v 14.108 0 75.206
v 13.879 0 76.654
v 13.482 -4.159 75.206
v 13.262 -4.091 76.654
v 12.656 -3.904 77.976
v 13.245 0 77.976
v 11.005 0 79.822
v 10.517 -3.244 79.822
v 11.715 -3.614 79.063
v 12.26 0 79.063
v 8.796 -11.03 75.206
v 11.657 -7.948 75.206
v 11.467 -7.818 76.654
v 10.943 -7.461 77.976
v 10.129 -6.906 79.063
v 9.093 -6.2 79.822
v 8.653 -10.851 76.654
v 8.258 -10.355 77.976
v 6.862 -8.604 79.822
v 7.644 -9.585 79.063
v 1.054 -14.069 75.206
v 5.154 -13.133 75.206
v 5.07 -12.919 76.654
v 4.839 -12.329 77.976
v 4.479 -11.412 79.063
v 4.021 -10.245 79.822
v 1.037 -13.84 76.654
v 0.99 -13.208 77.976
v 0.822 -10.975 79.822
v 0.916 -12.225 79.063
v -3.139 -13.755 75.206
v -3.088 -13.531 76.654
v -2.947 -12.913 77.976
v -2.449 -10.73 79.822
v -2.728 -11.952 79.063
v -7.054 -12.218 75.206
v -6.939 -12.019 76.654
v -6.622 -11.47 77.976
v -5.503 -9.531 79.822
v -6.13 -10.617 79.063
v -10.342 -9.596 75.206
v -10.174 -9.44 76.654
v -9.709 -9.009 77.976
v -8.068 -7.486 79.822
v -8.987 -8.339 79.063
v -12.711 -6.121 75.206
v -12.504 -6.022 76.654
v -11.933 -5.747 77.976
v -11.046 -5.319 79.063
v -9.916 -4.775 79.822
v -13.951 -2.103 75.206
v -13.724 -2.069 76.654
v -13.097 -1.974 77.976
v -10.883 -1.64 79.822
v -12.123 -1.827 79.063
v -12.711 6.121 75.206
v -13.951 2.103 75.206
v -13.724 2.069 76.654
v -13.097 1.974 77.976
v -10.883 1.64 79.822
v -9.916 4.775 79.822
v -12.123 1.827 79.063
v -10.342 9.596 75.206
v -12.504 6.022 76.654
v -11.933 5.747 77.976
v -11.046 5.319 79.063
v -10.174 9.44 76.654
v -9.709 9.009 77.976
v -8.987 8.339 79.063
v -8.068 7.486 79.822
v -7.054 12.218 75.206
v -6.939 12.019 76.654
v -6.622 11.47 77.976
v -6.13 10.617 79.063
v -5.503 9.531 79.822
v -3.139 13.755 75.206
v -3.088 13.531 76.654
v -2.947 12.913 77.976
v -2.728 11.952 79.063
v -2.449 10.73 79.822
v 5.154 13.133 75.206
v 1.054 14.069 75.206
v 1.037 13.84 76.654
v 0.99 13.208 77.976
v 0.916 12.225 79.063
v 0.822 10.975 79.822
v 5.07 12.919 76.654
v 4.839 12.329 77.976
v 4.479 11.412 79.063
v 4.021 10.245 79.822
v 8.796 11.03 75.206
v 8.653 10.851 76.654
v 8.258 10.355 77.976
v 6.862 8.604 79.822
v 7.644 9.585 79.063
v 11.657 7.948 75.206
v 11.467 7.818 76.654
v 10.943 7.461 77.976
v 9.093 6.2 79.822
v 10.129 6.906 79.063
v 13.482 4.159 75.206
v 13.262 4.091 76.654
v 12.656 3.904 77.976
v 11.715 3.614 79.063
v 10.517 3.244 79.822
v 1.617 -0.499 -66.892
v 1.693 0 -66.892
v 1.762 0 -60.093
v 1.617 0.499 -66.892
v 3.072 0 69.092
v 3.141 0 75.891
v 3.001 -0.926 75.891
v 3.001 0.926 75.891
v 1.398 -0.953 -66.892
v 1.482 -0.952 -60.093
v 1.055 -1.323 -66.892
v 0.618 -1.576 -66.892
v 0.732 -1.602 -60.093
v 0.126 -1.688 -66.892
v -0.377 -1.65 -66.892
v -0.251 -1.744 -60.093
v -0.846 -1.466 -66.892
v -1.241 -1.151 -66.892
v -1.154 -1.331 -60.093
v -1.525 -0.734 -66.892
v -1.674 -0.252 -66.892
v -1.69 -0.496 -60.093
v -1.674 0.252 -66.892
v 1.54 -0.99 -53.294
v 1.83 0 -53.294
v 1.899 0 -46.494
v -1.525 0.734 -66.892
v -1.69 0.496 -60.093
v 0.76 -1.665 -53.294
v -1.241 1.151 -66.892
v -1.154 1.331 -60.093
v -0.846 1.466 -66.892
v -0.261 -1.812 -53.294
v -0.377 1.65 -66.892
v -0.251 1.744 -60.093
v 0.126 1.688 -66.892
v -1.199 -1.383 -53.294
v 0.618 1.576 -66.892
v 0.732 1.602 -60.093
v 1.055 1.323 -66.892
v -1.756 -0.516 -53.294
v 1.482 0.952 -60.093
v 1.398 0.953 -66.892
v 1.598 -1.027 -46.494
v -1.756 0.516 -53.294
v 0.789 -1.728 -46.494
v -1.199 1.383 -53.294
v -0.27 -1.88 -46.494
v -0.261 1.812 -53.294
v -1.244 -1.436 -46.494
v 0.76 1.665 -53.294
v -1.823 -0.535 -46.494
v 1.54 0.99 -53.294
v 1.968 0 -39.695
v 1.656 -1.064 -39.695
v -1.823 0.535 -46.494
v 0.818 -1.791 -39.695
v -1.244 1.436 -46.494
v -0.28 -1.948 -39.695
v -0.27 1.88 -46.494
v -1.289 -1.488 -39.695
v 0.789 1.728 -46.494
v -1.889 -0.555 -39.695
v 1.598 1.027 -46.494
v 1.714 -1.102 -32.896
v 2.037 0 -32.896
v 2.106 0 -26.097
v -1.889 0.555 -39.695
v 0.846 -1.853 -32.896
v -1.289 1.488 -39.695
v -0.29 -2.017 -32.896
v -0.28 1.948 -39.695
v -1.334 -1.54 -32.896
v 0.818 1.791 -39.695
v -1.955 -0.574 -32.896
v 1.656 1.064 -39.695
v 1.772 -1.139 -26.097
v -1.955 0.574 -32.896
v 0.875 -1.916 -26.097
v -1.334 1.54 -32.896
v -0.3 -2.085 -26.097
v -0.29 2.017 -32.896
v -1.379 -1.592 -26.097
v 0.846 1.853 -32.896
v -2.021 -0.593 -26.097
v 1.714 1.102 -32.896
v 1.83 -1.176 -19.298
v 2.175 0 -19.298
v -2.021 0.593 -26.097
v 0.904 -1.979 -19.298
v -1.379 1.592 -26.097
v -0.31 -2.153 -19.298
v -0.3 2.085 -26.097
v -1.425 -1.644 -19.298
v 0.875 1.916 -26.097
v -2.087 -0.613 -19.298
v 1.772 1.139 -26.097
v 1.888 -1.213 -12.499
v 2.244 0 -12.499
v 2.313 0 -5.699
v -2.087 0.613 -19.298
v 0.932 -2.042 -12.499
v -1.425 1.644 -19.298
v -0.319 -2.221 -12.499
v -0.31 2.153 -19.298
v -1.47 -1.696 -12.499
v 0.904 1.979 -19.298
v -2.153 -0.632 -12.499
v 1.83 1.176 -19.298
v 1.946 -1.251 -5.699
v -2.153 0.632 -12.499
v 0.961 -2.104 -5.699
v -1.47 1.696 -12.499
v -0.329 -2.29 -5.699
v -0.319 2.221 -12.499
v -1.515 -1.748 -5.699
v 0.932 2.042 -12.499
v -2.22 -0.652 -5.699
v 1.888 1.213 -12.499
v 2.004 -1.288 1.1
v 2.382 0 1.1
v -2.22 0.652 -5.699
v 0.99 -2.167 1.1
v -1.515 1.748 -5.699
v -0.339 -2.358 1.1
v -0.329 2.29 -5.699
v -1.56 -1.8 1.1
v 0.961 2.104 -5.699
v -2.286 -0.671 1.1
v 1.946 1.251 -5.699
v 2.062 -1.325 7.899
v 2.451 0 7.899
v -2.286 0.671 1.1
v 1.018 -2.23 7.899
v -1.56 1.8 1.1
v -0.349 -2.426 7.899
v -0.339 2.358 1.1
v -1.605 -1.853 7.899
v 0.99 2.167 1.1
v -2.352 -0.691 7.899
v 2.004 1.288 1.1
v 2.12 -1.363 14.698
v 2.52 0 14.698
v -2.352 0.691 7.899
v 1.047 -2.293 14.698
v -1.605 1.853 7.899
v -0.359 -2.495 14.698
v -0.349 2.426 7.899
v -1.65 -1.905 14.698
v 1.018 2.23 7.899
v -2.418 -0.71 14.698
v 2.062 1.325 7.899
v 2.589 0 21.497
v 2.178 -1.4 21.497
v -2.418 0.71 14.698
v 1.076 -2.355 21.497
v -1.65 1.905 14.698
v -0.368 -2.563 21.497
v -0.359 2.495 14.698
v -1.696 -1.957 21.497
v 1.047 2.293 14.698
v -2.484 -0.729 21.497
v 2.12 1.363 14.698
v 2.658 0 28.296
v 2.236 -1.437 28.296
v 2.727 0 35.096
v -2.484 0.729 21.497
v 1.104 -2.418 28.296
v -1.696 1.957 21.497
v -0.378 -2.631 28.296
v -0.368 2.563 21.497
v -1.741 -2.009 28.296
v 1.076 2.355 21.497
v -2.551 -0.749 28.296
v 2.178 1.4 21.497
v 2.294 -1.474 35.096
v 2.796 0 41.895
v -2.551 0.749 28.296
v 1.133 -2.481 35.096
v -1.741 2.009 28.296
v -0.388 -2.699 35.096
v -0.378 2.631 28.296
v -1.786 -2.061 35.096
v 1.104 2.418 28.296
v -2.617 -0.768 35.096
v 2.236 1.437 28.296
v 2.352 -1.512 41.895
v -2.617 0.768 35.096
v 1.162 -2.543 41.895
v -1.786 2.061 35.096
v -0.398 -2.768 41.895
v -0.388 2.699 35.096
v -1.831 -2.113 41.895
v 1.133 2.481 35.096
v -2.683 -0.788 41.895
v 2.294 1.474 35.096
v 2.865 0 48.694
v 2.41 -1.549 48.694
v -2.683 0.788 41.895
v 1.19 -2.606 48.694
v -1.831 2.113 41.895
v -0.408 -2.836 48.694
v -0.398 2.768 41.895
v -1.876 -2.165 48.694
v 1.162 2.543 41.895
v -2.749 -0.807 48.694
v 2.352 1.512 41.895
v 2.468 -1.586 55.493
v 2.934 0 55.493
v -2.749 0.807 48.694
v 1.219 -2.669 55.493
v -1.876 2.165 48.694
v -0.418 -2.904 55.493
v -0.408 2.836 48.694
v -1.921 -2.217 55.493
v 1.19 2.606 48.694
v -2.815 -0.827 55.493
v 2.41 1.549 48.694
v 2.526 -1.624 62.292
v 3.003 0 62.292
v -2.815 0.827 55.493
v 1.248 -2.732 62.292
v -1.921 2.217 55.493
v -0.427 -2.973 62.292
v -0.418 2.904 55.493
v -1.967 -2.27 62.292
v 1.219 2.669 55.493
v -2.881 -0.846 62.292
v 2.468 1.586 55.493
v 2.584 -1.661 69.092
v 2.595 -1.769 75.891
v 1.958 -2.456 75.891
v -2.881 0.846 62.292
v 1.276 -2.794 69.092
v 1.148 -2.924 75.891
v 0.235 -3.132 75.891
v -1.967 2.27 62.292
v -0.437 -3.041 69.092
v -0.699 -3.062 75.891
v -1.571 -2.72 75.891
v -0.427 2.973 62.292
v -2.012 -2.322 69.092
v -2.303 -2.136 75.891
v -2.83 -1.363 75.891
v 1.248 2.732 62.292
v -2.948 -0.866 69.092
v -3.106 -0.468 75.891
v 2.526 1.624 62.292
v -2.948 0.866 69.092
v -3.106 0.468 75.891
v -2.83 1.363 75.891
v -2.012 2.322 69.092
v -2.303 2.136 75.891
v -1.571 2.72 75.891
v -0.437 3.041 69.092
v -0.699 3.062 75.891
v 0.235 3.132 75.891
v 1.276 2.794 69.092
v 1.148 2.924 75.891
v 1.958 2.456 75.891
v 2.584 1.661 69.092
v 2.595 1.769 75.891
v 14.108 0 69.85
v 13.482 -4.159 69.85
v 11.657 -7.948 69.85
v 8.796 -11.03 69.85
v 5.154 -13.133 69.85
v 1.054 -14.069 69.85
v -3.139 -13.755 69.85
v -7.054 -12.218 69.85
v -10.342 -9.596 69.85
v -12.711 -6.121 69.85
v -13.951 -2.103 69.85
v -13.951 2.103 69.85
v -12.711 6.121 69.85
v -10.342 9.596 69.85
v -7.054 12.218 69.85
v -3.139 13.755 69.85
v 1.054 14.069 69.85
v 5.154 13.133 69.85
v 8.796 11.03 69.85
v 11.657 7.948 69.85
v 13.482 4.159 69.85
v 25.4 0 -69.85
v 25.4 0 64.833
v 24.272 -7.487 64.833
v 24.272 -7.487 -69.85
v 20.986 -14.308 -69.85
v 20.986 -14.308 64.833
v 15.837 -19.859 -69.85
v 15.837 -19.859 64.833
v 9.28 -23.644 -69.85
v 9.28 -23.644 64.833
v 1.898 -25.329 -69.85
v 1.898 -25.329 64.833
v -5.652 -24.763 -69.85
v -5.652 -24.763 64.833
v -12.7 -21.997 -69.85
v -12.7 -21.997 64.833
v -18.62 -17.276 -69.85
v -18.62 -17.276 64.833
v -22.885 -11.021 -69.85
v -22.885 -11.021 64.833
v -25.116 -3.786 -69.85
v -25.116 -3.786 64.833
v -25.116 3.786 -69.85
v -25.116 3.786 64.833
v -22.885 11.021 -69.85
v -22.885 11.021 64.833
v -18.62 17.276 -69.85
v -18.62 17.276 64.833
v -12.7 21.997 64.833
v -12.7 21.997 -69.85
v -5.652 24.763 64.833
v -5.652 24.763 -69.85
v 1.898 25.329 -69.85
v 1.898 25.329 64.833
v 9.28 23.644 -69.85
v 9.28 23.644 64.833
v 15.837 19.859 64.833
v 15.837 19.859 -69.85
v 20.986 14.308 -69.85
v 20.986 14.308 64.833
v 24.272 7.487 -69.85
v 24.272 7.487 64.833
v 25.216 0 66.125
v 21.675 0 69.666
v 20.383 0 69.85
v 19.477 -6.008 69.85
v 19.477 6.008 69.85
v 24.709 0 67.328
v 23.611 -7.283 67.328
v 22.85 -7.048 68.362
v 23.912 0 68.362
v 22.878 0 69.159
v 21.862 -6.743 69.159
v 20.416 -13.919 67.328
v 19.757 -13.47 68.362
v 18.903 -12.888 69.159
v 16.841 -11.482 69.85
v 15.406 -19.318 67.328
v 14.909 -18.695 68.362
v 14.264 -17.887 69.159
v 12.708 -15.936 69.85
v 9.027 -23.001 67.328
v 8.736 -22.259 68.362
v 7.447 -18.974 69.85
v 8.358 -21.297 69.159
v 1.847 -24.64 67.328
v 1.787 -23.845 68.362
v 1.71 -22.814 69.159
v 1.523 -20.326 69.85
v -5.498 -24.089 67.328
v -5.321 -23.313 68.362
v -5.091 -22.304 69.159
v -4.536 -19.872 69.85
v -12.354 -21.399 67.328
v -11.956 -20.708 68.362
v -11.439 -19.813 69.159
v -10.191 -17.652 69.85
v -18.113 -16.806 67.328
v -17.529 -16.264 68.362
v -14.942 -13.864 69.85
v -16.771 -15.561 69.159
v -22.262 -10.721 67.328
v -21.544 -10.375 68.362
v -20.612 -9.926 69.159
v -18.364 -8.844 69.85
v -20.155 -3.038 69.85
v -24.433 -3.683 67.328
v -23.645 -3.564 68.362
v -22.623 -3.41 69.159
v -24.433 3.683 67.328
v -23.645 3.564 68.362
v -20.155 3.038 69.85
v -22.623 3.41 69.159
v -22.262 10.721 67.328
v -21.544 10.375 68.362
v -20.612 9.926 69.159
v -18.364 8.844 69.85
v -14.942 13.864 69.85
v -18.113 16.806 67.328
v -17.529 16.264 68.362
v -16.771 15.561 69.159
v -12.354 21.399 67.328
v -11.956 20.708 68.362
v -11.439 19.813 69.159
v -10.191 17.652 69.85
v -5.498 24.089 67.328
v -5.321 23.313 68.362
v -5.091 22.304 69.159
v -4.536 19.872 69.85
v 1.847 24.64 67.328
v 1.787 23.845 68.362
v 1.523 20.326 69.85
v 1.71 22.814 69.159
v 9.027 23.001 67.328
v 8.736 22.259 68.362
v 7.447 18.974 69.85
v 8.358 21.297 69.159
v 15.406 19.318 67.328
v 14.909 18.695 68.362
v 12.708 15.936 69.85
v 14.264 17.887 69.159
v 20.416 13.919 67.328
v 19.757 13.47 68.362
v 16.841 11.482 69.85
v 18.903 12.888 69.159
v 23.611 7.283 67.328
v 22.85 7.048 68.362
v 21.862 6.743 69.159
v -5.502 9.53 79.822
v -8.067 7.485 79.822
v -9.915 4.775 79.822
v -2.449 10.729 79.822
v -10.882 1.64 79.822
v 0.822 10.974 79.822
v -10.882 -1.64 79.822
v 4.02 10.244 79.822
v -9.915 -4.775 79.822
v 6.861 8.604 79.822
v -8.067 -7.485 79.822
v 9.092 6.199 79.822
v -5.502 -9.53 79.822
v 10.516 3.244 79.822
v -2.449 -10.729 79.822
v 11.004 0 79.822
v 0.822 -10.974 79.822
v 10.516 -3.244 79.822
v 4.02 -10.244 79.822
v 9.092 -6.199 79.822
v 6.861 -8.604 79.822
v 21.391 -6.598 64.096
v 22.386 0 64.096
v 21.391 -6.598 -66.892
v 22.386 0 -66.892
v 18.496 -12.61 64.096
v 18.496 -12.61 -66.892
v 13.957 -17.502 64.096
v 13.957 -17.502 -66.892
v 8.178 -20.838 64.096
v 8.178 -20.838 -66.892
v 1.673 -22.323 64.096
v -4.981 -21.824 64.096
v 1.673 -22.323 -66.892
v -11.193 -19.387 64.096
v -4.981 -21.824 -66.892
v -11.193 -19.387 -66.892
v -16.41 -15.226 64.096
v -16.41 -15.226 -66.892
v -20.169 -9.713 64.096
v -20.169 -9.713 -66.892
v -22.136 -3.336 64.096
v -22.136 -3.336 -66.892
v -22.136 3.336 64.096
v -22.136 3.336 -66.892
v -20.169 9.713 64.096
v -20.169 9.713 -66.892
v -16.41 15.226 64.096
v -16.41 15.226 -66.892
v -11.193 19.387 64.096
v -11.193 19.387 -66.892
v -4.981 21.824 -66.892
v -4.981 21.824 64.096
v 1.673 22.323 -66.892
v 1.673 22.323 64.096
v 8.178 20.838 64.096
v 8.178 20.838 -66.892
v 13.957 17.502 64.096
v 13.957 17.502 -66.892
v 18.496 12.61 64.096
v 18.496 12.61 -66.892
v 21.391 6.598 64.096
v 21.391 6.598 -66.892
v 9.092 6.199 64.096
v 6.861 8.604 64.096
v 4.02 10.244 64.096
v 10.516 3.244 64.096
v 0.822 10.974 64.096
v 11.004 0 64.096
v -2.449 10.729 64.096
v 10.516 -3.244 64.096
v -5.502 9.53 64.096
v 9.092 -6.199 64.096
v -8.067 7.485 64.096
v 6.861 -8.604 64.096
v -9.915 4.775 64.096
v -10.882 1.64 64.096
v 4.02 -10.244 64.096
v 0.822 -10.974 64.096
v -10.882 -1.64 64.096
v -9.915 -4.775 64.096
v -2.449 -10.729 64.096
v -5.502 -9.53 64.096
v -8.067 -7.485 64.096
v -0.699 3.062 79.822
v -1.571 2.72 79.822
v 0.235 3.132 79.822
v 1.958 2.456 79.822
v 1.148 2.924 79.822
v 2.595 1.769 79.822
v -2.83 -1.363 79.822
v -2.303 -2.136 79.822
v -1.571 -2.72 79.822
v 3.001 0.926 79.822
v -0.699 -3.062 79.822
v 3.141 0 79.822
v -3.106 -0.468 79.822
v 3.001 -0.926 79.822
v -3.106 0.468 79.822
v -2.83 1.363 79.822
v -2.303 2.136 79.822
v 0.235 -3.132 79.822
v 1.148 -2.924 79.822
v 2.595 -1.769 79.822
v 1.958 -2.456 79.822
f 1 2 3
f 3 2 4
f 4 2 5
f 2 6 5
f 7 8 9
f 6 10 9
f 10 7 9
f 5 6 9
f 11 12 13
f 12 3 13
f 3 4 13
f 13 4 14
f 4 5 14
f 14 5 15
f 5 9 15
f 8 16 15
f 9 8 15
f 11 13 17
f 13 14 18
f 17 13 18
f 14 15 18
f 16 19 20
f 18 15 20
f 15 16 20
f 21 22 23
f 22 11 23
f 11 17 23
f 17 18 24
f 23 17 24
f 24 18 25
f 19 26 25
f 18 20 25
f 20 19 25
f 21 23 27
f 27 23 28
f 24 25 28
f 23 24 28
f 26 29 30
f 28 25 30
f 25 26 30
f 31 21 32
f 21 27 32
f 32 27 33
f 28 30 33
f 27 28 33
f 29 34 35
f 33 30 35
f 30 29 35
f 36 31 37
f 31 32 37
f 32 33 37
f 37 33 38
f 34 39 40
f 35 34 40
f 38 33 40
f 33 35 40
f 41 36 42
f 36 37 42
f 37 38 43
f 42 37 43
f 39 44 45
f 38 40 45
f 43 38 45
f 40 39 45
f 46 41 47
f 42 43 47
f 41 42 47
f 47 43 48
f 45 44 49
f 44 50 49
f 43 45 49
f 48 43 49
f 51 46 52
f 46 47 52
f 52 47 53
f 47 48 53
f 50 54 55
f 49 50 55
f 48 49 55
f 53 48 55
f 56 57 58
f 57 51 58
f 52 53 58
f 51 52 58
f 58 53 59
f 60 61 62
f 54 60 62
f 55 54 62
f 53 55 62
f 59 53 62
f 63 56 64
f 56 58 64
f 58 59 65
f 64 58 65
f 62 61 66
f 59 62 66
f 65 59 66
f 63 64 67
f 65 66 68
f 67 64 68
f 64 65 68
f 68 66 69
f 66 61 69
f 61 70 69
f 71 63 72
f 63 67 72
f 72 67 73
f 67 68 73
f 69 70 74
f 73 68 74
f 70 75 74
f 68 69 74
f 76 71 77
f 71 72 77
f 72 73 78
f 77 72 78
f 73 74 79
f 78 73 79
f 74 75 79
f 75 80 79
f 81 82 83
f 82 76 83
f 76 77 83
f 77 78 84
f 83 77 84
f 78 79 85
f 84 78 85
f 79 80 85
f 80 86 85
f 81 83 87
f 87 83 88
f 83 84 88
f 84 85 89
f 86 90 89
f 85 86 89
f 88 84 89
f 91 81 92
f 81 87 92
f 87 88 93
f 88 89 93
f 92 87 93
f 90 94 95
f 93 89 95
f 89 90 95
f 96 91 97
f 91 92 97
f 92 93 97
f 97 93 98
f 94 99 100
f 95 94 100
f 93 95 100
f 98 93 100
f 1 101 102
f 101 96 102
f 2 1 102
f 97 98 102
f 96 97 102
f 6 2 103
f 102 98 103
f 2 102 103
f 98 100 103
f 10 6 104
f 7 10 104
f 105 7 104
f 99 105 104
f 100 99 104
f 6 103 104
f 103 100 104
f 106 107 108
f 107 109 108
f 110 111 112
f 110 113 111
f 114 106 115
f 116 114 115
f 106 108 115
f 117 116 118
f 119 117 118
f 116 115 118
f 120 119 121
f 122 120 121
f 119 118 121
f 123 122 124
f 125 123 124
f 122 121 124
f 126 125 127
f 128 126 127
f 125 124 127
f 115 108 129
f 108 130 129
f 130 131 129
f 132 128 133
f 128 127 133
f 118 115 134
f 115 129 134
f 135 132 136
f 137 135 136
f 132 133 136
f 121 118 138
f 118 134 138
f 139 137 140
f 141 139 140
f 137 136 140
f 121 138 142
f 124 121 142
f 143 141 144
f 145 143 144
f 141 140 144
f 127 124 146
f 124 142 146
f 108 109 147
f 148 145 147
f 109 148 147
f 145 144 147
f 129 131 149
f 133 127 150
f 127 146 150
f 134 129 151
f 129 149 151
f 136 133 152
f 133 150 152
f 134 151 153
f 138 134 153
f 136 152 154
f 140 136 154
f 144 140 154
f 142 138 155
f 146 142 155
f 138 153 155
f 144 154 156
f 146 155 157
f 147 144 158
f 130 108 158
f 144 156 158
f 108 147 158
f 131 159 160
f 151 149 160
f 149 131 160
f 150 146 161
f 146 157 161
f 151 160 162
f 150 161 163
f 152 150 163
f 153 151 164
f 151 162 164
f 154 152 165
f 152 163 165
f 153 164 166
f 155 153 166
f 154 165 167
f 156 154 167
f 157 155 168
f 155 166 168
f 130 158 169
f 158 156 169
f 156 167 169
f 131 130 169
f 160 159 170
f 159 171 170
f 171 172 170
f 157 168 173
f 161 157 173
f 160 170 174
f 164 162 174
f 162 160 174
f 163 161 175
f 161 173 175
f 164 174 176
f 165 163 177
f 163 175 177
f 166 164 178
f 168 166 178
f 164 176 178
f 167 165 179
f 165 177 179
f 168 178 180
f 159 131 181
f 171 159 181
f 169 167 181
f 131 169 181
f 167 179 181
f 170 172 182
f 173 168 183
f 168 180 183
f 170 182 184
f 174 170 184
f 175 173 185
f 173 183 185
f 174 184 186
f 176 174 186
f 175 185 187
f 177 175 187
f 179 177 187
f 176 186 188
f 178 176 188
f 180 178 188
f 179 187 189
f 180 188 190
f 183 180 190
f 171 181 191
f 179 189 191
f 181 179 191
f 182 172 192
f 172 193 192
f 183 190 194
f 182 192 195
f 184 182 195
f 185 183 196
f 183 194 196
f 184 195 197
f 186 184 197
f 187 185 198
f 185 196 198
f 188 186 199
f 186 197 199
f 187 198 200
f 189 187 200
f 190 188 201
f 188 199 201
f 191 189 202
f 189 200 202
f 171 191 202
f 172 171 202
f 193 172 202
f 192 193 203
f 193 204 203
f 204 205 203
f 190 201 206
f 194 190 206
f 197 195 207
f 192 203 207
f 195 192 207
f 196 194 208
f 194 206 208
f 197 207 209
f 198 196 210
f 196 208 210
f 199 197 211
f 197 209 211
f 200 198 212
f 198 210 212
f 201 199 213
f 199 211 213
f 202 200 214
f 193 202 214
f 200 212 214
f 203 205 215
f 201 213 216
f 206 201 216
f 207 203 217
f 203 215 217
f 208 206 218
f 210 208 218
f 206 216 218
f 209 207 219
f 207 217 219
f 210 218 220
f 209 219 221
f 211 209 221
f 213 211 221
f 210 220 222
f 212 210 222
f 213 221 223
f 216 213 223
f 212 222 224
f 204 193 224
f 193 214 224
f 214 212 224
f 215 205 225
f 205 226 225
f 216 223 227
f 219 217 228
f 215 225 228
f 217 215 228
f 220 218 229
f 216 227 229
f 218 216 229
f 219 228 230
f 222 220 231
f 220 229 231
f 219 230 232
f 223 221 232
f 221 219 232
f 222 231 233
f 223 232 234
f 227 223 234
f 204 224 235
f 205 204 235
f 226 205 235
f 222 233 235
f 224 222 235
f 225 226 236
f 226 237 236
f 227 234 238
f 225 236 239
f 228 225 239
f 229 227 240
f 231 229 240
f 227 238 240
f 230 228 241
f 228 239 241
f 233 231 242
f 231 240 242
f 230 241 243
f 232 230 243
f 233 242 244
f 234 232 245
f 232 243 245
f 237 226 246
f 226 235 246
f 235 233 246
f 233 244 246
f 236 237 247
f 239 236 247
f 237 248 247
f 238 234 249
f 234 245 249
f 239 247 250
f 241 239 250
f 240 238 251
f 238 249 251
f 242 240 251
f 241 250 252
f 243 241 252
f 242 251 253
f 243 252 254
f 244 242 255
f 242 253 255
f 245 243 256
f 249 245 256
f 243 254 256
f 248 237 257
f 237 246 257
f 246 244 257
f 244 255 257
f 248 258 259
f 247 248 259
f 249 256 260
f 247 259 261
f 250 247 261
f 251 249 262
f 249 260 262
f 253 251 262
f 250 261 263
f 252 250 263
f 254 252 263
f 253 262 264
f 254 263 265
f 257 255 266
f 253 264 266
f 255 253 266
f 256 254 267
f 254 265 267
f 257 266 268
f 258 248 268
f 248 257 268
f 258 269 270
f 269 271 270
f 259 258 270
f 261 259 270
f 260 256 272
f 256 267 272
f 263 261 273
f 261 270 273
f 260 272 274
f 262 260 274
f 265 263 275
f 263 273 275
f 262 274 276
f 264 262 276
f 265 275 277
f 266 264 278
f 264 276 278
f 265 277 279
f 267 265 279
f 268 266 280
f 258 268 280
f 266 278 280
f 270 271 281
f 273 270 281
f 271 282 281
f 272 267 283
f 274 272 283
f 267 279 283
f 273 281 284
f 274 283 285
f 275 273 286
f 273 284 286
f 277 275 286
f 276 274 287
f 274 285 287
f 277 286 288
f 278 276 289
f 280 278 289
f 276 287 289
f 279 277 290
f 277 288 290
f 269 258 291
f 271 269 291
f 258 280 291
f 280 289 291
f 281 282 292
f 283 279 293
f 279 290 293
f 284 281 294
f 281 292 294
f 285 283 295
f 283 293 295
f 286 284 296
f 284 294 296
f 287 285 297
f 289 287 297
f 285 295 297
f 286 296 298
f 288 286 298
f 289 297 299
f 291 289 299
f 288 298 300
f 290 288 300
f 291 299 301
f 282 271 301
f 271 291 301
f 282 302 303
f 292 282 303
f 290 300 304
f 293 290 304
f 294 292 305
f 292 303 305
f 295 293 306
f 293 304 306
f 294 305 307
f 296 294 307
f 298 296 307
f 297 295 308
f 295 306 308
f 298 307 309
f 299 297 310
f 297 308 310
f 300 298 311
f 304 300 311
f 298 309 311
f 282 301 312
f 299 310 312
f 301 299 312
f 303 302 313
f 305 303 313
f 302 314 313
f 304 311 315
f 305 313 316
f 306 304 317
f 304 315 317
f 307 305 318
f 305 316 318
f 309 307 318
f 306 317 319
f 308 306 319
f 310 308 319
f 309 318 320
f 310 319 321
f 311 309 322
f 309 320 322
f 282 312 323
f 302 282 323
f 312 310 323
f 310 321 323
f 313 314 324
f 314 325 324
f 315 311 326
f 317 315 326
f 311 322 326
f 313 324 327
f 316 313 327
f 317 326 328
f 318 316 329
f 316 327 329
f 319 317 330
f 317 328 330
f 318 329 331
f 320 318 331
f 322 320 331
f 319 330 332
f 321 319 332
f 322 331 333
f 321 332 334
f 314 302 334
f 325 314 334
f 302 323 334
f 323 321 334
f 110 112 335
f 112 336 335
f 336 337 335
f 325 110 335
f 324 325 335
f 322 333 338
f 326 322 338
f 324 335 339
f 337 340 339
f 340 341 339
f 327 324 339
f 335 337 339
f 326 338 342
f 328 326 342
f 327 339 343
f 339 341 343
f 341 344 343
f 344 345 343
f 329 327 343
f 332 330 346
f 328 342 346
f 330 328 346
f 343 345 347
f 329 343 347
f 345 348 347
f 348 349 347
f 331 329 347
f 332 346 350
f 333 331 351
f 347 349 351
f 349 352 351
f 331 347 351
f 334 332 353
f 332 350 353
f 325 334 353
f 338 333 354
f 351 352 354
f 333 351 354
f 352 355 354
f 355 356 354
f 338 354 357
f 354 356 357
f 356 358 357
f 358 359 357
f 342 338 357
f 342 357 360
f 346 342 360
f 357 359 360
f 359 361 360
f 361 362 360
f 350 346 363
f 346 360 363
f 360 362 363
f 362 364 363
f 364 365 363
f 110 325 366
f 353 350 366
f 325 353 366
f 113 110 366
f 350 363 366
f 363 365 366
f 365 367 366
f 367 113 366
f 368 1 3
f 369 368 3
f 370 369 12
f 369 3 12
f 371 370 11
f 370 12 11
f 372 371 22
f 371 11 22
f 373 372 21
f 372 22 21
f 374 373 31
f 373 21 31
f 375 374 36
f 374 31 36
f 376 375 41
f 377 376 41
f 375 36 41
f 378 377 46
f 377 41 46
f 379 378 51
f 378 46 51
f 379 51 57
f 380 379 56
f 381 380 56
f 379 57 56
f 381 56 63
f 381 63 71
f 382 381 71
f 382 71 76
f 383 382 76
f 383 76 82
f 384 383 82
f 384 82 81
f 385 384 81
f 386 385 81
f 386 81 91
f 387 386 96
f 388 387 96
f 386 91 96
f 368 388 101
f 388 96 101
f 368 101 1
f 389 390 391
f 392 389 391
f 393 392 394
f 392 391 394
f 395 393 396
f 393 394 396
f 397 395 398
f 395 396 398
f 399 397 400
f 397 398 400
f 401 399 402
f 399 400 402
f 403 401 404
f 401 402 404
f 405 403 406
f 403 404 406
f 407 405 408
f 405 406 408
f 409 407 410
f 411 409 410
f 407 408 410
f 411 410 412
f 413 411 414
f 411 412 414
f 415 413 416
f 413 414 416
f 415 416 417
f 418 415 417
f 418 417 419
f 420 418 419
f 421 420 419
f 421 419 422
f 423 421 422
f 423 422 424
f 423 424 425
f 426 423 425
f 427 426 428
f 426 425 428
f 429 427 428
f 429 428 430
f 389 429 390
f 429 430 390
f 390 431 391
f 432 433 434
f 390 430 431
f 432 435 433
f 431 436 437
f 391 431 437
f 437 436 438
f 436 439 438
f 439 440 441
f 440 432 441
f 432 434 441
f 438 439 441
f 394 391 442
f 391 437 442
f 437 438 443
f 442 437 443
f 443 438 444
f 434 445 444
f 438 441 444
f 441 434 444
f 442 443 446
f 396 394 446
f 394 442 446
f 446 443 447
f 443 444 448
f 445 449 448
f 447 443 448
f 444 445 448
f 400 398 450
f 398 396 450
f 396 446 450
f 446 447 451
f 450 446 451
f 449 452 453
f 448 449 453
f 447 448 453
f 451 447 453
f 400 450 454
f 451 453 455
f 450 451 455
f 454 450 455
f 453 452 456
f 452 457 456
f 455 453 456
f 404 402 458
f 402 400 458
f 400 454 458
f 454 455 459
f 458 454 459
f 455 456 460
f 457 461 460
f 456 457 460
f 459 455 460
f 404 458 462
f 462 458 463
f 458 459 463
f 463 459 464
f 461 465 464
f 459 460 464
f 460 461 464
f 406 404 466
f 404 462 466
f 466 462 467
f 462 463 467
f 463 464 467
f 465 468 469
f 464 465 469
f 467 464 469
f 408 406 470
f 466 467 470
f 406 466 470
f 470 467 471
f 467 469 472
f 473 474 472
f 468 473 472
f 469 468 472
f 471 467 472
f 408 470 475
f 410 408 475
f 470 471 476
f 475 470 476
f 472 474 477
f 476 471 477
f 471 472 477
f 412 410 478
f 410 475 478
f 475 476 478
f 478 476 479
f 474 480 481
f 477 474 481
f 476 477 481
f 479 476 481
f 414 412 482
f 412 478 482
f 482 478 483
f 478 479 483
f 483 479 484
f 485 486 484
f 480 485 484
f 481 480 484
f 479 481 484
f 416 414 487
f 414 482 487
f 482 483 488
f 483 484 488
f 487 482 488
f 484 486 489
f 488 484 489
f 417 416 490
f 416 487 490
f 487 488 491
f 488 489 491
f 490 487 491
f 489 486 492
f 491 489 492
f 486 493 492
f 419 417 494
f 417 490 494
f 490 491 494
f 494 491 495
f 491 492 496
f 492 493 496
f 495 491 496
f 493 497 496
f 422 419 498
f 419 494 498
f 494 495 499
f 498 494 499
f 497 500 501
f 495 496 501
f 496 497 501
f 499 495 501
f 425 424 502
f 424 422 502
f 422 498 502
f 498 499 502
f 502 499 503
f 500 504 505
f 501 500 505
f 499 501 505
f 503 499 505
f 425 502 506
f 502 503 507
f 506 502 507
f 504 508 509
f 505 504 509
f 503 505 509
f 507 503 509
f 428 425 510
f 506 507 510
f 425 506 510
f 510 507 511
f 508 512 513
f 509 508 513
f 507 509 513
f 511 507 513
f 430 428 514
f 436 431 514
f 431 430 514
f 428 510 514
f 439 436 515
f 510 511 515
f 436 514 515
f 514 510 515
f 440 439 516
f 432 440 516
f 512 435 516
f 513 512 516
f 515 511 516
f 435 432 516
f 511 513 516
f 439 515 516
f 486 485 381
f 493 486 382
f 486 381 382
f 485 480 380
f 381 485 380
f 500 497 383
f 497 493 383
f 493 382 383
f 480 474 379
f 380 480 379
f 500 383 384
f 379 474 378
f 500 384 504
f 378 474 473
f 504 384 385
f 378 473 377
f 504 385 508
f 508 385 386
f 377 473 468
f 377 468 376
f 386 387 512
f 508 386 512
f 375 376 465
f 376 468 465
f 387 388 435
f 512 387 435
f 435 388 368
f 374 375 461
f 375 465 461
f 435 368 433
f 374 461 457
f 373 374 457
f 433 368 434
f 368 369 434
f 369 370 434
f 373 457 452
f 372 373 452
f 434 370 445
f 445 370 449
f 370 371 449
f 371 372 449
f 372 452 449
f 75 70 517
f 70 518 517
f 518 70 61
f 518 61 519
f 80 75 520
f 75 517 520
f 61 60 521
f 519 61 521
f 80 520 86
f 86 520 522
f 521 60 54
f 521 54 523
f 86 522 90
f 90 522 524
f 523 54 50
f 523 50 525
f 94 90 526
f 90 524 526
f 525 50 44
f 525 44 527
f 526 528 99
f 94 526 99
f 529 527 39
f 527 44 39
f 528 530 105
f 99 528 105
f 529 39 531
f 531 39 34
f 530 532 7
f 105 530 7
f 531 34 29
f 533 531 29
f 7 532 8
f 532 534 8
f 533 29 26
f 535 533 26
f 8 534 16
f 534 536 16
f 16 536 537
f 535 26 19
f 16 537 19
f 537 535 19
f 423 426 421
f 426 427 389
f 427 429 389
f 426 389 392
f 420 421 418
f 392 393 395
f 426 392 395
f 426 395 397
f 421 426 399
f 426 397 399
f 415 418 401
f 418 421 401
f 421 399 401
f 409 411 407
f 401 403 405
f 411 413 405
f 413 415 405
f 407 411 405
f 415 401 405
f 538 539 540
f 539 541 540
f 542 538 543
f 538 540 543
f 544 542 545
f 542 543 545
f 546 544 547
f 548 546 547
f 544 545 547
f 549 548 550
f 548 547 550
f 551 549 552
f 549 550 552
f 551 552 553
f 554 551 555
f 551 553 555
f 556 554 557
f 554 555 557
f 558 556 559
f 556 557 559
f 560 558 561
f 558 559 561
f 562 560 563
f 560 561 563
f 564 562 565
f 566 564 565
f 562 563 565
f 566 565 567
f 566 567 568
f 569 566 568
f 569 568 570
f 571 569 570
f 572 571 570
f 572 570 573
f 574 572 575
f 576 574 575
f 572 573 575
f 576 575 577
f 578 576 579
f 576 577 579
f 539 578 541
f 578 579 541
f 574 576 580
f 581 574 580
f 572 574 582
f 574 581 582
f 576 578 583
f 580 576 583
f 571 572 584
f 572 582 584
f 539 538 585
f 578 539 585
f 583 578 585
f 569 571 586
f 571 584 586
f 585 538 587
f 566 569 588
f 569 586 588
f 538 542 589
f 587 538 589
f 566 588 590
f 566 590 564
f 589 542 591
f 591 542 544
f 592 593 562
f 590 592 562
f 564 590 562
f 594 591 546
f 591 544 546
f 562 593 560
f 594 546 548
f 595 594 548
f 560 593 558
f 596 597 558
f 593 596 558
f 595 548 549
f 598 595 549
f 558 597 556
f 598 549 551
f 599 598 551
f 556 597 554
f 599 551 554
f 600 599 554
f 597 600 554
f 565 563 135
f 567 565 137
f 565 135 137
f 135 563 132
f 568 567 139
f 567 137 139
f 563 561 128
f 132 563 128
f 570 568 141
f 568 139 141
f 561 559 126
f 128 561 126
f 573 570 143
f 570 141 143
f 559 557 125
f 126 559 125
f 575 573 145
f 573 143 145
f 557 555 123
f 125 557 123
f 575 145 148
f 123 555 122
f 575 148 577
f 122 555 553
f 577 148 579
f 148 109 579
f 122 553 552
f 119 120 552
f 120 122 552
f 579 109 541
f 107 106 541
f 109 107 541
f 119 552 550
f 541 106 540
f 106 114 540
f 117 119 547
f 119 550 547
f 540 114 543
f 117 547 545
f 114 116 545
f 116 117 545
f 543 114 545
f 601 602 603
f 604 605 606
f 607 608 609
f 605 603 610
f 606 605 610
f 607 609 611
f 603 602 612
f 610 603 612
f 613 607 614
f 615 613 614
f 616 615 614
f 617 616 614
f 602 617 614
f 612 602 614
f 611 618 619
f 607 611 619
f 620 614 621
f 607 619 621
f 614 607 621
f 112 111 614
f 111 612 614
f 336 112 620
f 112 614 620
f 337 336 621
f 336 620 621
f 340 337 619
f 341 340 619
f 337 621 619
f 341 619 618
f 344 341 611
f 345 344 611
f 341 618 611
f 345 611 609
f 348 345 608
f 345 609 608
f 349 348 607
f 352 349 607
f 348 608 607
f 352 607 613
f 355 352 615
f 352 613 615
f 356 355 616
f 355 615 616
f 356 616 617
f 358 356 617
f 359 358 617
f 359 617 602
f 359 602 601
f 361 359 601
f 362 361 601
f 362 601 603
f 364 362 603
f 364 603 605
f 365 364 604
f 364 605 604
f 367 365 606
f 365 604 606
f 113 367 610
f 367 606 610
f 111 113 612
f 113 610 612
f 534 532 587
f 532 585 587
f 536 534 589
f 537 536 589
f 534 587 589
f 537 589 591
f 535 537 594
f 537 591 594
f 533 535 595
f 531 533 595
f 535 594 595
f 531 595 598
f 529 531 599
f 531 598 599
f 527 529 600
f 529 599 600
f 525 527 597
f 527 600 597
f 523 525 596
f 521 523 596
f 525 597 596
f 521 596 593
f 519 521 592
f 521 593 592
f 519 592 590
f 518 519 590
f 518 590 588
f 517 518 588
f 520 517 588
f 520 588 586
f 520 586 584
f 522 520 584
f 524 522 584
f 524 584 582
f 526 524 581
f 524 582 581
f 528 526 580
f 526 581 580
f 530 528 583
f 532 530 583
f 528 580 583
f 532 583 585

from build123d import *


# Not quite as in the source:
# - a fillet or chamfer that OpenCascade refuses, or shapes differently, is made with other operations: its cross-section is extruded or revolved along the edge and cut away or added


with BuildPart() as f1:
    # F0 (on Front) → F1 (revolve)
    with BuildSketch(Plane.XZ):
        Polygon((25.4, -69.85), (25.4, 69.85), (14.1084063798, 69.85), (14.1084063798, 79.8223763704), (11.0044367611, 79.8223763704), (11.0044367611, 75.8906826377), (11.0044367611, 64.0955939889), (22.3856568336, 64.0955939889), (22.3856568336, -66.8919235468), (1.6925277887, -66.8919235468), (3.1410455704, 75.8906826377), (3.1410455704, 79.8223763704), (0, 79.8223763704), (0, 0), (0, -69.85), align=None)
    revolve(axis=Axis((0, 0, 39.9111881852), (0, 0, -1)))

    # F2: fillet of radius 5.08 on 2 edges, made by hand

    # F2_s1 → F2_t2 (revolve, cut)
    with BuildSketch(Plane.XZ):
        with BuildLine():
            ThreePointArc((25.4004, 64.7690343146), (23.9121024484, 68.3621024484), (20.3190343146, 69.8504))
            Line((20.3190343146, 69.8504), (20.3190343146, 70.3585365685))
            ThreePointArc((20.3190343146, 70.3585365685), (22.8595171573, 70.3581365685), (25.4, 70.3581365685))
            Line((25.4, 70.3581365685), (25.9081365685, 69.85))
            ThreePointArc((25.9081365685, 69.85), (25.9081365685, 67.3095171573), (25.9085365685, 64.7690343146))
            Line((25.9085365685, 64.7690343146), (25.4004, 64.7690343146))
        make_face()
    revolve(axis=Axis((0, 0, 69.85), (0, 0, -1)), mode=Mode.SUBTRACT)

    # F2_s3 → F2_t4 (revolve, cut)
    with BuildSketch(Plane.XZ):
        with BuildLine():
            ThreePointArc((14.1088063798, 75.1418102884), (13.2622316021, 77.9501591266), (11.0045924005, 79.8227448489))
            Line((11.0045924005, 79.8227448489), (11.2023075712, 80.2908383049))
            ThreePointArc((11.2023075712, 80.2908383049), (12.5564993902, 80.330512939), (14.1084063798, 80.330512939))
            Line((14.1084063798, 80.330512939), (14.6165429484, 79.8223763704))
            ThreePointArc((14.6165429484, 79.8223763704), (14.6165429484, 77.4820933294), (14.6169429484, 75.1418102884))
            Line((14.6169429484, 75.1418102884), (14.1088063798, 75.1418102884))
        make_face()
    revolve(axis=Axis((0, 0, 79.8223763704), (0, 0, -1)), mode=Mode.SUBTRACT)


solid = f1.part
